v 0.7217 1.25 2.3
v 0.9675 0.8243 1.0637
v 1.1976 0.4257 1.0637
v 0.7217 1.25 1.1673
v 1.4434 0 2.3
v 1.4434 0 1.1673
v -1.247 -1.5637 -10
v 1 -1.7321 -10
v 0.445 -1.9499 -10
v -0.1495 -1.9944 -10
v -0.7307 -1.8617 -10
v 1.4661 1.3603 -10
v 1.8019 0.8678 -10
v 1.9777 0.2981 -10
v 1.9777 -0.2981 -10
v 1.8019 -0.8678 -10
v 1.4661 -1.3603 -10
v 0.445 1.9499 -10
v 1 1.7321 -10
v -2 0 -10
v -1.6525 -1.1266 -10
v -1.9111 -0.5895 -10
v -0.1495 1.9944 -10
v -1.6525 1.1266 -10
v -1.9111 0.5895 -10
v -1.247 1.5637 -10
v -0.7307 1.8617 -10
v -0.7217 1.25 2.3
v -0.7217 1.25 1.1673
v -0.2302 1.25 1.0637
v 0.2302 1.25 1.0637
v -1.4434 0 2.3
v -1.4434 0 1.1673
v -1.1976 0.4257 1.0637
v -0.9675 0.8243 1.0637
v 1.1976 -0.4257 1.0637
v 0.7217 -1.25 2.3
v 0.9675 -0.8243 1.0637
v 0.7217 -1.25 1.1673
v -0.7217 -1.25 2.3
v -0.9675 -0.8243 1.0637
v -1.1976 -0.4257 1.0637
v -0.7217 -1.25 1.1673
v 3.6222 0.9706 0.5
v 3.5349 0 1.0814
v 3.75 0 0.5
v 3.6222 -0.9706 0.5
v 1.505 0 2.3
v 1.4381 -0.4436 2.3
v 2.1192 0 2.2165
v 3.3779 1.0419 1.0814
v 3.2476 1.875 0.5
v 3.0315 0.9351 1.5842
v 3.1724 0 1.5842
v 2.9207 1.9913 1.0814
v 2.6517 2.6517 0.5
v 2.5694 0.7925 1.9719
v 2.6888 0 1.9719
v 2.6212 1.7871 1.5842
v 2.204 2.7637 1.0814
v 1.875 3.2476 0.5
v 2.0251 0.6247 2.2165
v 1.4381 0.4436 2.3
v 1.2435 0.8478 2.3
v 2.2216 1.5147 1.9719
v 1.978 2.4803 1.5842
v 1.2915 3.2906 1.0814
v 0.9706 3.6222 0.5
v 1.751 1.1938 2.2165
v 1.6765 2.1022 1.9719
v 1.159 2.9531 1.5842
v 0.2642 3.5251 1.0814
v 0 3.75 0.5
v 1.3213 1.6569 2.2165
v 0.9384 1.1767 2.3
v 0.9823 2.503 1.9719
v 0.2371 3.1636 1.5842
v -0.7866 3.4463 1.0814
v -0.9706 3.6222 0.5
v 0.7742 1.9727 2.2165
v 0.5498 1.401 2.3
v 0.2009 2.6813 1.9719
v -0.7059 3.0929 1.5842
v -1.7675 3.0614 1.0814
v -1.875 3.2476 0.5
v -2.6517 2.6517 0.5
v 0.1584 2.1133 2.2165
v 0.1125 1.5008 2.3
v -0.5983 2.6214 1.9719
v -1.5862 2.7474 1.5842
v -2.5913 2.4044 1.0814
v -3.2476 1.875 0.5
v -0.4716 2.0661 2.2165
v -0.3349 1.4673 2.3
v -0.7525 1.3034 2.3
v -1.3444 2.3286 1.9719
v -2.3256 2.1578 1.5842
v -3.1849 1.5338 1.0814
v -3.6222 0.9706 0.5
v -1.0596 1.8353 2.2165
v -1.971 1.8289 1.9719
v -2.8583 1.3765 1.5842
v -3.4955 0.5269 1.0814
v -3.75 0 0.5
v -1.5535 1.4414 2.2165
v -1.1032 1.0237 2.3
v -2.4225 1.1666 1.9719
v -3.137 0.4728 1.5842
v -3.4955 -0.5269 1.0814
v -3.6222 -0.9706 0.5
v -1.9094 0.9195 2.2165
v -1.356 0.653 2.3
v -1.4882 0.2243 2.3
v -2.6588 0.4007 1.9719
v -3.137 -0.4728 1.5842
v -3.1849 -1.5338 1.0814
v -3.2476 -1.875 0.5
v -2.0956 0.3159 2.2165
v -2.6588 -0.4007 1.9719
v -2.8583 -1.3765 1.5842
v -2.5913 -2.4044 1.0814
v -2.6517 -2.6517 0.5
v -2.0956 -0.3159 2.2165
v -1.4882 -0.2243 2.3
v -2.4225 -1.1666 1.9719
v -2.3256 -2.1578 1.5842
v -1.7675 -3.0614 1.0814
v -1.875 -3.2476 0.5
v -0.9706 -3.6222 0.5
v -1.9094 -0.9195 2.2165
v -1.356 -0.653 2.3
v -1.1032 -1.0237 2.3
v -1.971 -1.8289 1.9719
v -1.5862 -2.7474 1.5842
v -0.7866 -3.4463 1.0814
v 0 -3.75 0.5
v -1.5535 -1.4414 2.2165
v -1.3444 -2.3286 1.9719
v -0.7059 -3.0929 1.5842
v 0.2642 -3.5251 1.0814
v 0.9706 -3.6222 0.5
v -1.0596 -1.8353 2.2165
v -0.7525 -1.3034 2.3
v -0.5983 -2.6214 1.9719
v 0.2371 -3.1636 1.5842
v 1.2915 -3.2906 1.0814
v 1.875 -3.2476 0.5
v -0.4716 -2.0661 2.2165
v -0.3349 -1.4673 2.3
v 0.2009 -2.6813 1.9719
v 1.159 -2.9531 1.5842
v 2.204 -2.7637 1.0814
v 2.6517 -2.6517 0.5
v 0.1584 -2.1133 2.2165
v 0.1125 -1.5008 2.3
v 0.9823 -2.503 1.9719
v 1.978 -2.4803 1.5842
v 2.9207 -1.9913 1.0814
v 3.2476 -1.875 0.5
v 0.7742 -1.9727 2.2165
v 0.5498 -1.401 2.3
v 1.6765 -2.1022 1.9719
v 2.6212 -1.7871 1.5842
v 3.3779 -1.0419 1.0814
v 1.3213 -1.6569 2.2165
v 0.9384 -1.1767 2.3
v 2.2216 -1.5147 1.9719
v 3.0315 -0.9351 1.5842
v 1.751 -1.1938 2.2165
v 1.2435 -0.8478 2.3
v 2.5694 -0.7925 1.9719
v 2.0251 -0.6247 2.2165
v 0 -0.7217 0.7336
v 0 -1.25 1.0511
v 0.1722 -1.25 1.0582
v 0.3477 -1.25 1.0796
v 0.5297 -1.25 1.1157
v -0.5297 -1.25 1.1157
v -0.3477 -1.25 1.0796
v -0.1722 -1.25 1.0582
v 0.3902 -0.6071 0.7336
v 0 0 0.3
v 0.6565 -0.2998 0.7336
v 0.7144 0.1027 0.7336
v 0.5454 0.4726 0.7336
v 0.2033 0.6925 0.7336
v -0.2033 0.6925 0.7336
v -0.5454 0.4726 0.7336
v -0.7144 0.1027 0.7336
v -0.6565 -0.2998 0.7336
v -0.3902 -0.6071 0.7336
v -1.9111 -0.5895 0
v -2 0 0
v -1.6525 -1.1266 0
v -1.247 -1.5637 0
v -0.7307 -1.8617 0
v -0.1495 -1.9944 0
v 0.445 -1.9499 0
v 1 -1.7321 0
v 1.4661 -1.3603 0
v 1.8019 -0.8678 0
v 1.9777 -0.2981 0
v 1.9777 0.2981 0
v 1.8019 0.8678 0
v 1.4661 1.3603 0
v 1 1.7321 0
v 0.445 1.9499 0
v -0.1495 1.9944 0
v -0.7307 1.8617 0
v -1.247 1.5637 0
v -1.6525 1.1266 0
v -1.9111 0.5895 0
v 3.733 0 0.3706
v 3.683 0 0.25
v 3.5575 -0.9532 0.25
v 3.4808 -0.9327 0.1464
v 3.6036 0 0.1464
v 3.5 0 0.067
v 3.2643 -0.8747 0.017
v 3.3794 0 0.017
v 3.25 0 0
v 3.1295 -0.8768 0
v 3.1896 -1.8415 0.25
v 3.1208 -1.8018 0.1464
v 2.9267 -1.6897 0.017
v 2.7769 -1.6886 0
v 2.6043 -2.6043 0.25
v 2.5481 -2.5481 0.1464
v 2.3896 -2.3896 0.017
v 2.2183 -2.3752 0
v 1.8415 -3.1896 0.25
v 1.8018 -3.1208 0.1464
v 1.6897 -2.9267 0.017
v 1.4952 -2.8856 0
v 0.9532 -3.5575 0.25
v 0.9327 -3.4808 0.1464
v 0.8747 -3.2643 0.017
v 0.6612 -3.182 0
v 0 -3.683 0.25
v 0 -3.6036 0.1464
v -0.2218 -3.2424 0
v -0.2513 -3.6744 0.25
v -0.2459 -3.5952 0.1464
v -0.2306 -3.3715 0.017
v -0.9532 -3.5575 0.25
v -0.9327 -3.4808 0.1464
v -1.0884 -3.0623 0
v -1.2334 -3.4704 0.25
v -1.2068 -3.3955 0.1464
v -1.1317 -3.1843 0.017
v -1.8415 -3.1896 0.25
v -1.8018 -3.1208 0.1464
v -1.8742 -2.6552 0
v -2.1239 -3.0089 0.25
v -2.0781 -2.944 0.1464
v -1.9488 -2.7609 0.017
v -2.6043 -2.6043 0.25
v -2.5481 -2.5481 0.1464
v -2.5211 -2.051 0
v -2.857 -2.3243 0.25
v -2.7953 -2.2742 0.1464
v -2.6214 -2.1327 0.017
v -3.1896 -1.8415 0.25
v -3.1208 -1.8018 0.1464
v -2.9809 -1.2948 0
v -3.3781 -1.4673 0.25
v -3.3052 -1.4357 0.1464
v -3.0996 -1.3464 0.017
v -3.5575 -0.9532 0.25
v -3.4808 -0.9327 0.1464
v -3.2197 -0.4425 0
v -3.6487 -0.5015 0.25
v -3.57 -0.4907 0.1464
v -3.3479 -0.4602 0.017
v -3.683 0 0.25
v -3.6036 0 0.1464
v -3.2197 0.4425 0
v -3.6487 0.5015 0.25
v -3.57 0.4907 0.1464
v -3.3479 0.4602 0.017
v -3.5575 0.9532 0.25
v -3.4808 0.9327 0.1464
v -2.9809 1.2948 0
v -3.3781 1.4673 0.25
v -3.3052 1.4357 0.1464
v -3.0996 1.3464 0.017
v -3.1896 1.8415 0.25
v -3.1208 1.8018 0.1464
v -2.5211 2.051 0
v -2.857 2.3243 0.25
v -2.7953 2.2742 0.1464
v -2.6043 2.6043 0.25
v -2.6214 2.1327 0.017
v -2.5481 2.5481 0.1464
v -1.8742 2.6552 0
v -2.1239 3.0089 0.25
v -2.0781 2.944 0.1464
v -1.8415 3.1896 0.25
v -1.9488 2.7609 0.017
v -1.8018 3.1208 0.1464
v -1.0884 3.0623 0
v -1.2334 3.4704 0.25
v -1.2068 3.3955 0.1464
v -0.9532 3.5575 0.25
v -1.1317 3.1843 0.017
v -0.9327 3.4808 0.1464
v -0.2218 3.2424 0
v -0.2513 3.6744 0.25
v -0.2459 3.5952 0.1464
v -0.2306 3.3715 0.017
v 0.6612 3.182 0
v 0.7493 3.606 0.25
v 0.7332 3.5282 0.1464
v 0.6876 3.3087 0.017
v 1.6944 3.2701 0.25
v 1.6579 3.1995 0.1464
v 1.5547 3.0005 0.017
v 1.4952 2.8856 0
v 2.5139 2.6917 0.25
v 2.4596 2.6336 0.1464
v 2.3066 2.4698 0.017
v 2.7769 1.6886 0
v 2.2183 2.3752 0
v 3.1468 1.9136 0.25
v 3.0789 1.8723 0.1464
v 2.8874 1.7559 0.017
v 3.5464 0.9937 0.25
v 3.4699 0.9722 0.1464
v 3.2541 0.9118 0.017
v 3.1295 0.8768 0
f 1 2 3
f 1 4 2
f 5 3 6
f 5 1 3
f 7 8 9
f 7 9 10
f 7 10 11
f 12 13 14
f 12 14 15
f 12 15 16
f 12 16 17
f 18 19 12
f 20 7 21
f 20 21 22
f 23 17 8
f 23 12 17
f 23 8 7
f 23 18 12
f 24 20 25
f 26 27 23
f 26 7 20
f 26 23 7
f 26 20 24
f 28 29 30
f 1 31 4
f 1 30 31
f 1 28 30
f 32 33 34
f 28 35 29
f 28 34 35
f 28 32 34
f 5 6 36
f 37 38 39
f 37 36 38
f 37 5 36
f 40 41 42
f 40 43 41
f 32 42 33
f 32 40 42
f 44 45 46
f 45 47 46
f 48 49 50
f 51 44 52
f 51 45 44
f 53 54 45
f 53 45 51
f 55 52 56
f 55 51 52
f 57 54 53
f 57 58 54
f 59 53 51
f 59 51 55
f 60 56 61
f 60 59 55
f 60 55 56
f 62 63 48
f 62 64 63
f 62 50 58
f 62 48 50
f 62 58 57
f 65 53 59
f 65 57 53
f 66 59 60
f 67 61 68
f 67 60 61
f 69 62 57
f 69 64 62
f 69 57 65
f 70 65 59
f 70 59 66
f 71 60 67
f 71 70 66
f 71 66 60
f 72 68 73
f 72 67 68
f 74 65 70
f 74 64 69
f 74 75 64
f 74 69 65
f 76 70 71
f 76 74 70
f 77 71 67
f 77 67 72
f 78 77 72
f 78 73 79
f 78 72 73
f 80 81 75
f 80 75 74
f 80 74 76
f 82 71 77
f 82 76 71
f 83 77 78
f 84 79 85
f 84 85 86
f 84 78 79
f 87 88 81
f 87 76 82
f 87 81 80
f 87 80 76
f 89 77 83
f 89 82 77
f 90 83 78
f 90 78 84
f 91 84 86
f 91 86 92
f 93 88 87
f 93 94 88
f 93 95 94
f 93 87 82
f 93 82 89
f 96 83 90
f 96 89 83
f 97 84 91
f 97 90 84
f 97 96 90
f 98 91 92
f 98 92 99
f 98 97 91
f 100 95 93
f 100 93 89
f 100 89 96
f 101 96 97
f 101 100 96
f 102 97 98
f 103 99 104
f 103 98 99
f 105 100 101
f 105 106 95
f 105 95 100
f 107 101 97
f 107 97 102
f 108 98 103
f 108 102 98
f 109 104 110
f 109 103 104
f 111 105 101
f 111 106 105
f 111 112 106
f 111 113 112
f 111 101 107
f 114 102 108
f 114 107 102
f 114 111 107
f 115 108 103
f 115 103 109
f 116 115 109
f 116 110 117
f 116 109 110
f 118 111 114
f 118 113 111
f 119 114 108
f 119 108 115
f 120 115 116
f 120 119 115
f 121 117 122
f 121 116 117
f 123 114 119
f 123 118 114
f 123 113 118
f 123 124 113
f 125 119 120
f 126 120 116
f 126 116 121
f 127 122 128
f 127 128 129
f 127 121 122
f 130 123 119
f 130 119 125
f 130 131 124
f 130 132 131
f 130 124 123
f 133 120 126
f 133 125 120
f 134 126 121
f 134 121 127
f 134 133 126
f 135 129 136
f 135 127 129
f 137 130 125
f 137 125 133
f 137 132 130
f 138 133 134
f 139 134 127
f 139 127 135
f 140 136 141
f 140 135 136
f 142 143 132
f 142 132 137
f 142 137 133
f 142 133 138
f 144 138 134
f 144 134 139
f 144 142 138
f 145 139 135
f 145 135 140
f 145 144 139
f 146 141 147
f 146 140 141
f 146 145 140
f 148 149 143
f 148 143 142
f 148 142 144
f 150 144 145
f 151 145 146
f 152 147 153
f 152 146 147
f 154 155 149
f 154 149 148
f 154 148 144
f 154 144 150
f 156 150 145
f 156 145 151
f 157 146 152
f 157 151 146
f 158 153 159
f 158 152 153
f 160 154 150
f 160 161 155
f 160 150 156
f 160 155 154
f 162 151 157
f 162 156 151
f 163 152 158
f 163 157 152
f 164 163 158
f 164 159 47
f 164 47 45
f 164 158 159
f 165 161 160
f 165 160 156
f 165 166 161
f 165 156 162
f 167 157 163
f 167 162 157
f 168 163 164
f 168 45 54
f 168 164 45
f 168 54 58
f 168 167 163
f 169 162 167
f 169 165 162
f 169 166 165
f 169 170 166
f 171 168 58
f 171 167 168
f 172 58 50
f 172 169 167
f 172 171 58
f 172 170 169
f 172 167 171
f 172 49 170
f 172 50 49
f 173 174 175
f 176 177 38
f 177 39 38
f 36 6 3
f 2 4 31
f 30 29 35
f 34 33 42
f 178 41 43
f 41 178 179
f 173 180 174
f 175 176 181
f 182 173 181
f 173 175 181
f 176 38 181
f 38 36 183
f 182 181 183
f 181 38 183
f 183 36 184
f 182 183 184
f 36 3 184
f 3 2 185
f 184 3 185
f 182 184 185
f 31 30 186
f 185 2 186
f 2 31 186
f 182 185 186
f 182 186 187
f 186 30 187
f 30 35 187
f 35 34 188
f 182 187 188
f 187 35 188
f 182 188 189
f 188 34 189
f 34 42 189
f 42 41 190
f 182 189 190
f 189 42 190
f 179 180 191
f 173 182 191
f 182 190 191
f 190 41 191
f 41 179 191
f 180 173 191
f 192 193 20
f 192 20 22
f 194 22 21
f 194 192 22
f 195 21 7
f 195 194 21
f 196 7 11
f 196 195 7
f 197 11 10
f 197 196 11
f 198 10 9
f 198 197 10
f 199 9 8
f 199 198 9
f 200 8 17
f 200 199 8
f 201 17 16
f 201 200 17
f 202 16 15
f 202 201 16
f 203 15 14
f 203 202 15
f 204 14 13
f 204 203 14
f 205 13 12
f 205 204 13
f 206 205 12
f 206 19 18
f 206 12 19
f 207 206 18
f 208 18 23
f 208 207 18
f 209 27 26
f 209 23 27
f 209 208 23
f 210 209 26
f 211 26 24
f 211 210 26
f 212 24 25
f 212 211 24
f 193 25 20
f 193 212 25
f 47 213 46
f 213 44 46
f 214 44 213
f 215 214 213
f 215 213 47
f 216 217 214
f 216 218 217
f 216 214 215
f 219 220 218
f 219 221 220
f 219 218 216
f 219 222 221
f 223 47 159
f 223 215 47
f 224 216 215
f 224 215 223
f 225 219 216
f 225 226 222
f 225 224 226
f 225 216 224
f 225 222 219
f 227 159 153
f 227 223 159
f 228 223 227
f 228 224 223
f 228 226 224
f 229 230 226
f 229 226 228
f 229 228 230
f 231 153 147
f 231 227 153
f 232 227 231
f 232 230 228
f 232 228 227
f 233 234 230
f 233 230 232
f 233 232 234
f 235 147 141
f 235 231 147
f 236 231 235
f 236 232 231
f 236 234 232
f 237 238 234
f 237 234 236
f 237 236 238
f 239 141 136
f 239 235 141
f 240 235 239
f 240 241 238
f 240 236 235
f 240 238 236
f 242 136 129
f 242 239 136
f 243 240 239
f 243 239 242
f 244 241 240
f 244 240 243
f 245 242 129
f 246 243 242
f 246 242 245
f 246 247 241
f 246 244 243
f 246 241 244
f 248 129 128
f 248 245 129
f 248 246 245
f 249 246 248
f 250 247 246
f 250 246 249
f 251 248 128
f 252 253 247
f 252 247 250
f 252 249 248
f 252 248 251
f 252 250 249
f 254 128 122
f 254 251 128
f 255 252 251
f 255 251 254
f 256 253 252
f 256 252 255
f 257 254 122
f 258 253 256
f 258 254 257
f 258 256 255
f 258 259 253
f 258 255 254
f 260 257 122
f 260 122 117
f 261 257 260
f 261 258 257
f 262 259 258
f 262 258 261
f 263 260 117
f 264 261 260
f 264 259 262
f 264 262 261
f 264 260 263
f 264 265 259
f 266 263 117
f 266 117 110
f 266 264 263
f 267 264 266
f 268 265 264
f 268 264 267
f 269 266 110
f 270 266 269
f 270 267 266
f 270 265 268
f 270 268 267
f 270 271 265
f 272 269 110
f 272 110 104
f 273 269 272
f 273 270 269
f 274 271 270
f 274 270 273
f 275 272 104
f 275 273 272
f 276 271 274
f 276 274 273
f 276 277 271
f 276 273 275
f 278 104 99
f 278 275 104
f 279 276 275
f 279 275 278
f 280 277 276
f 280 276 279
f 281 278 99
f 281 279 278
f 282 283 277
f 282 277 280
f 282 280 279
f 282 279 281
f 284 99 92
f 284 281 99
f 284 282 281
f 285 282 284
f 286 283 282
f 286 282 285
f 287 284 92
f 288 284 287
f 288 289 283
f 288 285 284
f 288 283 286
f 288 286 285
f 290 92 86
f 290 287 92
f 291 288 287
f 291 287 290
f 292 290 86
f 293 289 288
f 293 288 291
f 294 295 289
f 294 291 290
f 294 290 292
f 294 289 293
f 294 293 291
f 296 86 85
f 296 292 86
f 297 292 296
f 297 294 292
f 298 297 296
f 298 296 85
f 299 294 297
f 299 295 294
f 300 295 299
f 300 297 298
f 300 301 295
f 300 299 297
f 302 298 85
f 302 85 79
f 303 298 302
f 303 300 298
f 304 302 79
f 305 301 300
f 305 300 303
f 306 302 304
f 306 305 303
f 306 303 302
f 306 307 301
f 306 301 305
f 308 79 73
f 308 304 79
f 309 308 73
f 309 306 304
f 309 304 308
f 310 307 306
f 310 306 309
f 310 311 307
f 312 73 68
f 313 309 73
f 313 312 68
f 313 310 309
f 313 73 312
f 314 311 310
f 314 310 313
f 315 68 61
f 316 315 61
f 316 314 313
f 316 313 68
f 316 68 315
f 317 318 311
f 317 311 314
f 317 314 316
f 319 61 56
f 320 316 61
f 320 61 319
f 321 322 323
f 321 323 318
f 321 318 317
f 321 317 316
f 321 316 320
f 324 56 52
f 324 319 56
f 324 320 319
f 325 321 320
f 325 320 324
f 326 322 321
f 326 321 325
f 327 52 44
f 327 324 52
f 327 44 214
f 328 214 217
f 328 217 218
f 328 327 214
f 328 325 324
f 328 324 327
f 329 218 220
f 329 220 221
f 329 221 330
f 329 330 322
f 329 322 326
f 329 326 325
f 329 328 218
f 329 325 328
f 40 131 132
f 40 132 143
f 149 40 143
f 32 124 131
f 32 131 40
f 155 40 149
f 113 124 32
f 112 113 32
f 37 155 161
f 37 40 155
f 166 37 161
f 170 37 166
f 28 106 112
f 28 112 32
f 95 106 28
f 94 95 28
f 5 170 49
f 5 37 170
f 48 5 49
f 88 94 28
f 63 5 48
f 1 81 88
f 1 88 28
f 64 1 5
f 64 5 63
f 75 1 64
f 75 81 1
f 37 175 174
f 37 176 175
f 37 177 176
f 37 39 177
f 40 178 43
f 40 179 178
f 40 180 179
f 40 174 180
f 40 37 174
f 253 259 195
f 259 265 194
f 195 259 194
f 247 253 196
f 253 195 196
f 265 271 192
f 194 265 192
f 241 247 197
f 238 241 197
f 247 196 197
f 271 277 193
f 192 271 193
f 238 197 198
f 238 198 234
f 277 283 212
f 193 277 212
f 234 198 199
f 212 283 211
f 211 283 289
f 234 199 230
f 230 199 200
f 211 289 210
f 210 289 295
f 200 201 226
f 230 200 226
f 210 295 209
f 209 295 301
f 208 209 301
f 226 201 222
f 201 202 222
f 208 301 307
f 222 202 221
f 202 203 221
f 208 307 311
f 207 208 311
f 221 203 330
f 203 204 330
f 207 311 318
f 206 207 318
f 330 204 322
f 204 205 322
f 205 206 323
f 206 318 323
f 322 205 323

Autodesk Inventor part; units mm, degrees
ref_plane "YZ Plane" through (0, 0, 0) normal (1, 0, 0) x (0, 1, 0)
ref_plane "XZ Plane" through (0, 0, 0) normal (0, 1, 0) x (-1, 0, 0)
ref_plane "XY Plane" through (0, 0, 0) normal (0, 0, 1) x (1, 0, 0)
sketch "Sketch1" plane through (0, 0, 0) normal (0, 0, 1) x (1, 0, 0)
  circle A0 centre (0, 0) radius 3.75
  dimension "d0" = 7.5
extrude "Extrusion1" add sketch "Sketch1" along normal blind 2.3
fillet "Fillet3" radius 0.5 1 edges at (-3.75, 0, 0)
fillet "Fillet4" radius 2.3 1 edges at (-3.75, 0, 2.3)
sketch "草圖6" plane through (0, 0, 2.3) normal (0, 0, 1) x (1, 0, 0)
  circle A0 centre (0, 0) radius 1.505 projected
  line L0 (0.7217, 1.25) -> (1.4434, 0)
  line L1 (1.4434, 0) -> (0.7217, -1.25)
  line L2 (0.7217, -1.25) -> (-0.7217, -1.25)
  line L3 (-0.7217, -1.25) -> (-1.4434, 0)
  line L4 (-1.4434, 0) -> (-0.7217, 1.25)
  line L5 (-0.7217, 1.25) -> (0.7217, 1.25)
  dimension "d27" = 2.5
extrude "擠出4" cut sketch "草圖6" against normal blind 2 contours L0 L1 L2 L3 L4 L5
sketch "草圖7" plane through (0, 0, 0) normal (1, 0, 0) x (0, 1, 0)
  line L0 (0, 0.3) -> (-2, 1.5017)
  line L1 (-2, 1.5017) -> (-2, 0.3)
  line L2 (0, 0.3) -> (-2, 0.3)
  line L3 (0, 0) -> (0, 2.4201)
  dimension "d30" = 0.3
  dimension "d31" = 31
  dimension "d34" = 2
revolve "迴轉3" add sketch "草圖7" angle 360 about axis through (0, 0, 0) along (0, 0, 1)
sketch "草圖8" plane through (0, 0, 0) normal (0, 0, -1) x (-1, 0, 0)
  circle A0 centre (0, 0) radius 3.25 projected
  circle A1 centre (0, 0) radius 2
  dimension "d35" = 4
extrude "擠出5" add sketch "草圖8" along normal blind 10 contours A1
thread "螺紋2" size "M4x0.7" class "6g" standard "ANSI Metric M Profile" full length
properties part number "screw_M3_10_hex"
